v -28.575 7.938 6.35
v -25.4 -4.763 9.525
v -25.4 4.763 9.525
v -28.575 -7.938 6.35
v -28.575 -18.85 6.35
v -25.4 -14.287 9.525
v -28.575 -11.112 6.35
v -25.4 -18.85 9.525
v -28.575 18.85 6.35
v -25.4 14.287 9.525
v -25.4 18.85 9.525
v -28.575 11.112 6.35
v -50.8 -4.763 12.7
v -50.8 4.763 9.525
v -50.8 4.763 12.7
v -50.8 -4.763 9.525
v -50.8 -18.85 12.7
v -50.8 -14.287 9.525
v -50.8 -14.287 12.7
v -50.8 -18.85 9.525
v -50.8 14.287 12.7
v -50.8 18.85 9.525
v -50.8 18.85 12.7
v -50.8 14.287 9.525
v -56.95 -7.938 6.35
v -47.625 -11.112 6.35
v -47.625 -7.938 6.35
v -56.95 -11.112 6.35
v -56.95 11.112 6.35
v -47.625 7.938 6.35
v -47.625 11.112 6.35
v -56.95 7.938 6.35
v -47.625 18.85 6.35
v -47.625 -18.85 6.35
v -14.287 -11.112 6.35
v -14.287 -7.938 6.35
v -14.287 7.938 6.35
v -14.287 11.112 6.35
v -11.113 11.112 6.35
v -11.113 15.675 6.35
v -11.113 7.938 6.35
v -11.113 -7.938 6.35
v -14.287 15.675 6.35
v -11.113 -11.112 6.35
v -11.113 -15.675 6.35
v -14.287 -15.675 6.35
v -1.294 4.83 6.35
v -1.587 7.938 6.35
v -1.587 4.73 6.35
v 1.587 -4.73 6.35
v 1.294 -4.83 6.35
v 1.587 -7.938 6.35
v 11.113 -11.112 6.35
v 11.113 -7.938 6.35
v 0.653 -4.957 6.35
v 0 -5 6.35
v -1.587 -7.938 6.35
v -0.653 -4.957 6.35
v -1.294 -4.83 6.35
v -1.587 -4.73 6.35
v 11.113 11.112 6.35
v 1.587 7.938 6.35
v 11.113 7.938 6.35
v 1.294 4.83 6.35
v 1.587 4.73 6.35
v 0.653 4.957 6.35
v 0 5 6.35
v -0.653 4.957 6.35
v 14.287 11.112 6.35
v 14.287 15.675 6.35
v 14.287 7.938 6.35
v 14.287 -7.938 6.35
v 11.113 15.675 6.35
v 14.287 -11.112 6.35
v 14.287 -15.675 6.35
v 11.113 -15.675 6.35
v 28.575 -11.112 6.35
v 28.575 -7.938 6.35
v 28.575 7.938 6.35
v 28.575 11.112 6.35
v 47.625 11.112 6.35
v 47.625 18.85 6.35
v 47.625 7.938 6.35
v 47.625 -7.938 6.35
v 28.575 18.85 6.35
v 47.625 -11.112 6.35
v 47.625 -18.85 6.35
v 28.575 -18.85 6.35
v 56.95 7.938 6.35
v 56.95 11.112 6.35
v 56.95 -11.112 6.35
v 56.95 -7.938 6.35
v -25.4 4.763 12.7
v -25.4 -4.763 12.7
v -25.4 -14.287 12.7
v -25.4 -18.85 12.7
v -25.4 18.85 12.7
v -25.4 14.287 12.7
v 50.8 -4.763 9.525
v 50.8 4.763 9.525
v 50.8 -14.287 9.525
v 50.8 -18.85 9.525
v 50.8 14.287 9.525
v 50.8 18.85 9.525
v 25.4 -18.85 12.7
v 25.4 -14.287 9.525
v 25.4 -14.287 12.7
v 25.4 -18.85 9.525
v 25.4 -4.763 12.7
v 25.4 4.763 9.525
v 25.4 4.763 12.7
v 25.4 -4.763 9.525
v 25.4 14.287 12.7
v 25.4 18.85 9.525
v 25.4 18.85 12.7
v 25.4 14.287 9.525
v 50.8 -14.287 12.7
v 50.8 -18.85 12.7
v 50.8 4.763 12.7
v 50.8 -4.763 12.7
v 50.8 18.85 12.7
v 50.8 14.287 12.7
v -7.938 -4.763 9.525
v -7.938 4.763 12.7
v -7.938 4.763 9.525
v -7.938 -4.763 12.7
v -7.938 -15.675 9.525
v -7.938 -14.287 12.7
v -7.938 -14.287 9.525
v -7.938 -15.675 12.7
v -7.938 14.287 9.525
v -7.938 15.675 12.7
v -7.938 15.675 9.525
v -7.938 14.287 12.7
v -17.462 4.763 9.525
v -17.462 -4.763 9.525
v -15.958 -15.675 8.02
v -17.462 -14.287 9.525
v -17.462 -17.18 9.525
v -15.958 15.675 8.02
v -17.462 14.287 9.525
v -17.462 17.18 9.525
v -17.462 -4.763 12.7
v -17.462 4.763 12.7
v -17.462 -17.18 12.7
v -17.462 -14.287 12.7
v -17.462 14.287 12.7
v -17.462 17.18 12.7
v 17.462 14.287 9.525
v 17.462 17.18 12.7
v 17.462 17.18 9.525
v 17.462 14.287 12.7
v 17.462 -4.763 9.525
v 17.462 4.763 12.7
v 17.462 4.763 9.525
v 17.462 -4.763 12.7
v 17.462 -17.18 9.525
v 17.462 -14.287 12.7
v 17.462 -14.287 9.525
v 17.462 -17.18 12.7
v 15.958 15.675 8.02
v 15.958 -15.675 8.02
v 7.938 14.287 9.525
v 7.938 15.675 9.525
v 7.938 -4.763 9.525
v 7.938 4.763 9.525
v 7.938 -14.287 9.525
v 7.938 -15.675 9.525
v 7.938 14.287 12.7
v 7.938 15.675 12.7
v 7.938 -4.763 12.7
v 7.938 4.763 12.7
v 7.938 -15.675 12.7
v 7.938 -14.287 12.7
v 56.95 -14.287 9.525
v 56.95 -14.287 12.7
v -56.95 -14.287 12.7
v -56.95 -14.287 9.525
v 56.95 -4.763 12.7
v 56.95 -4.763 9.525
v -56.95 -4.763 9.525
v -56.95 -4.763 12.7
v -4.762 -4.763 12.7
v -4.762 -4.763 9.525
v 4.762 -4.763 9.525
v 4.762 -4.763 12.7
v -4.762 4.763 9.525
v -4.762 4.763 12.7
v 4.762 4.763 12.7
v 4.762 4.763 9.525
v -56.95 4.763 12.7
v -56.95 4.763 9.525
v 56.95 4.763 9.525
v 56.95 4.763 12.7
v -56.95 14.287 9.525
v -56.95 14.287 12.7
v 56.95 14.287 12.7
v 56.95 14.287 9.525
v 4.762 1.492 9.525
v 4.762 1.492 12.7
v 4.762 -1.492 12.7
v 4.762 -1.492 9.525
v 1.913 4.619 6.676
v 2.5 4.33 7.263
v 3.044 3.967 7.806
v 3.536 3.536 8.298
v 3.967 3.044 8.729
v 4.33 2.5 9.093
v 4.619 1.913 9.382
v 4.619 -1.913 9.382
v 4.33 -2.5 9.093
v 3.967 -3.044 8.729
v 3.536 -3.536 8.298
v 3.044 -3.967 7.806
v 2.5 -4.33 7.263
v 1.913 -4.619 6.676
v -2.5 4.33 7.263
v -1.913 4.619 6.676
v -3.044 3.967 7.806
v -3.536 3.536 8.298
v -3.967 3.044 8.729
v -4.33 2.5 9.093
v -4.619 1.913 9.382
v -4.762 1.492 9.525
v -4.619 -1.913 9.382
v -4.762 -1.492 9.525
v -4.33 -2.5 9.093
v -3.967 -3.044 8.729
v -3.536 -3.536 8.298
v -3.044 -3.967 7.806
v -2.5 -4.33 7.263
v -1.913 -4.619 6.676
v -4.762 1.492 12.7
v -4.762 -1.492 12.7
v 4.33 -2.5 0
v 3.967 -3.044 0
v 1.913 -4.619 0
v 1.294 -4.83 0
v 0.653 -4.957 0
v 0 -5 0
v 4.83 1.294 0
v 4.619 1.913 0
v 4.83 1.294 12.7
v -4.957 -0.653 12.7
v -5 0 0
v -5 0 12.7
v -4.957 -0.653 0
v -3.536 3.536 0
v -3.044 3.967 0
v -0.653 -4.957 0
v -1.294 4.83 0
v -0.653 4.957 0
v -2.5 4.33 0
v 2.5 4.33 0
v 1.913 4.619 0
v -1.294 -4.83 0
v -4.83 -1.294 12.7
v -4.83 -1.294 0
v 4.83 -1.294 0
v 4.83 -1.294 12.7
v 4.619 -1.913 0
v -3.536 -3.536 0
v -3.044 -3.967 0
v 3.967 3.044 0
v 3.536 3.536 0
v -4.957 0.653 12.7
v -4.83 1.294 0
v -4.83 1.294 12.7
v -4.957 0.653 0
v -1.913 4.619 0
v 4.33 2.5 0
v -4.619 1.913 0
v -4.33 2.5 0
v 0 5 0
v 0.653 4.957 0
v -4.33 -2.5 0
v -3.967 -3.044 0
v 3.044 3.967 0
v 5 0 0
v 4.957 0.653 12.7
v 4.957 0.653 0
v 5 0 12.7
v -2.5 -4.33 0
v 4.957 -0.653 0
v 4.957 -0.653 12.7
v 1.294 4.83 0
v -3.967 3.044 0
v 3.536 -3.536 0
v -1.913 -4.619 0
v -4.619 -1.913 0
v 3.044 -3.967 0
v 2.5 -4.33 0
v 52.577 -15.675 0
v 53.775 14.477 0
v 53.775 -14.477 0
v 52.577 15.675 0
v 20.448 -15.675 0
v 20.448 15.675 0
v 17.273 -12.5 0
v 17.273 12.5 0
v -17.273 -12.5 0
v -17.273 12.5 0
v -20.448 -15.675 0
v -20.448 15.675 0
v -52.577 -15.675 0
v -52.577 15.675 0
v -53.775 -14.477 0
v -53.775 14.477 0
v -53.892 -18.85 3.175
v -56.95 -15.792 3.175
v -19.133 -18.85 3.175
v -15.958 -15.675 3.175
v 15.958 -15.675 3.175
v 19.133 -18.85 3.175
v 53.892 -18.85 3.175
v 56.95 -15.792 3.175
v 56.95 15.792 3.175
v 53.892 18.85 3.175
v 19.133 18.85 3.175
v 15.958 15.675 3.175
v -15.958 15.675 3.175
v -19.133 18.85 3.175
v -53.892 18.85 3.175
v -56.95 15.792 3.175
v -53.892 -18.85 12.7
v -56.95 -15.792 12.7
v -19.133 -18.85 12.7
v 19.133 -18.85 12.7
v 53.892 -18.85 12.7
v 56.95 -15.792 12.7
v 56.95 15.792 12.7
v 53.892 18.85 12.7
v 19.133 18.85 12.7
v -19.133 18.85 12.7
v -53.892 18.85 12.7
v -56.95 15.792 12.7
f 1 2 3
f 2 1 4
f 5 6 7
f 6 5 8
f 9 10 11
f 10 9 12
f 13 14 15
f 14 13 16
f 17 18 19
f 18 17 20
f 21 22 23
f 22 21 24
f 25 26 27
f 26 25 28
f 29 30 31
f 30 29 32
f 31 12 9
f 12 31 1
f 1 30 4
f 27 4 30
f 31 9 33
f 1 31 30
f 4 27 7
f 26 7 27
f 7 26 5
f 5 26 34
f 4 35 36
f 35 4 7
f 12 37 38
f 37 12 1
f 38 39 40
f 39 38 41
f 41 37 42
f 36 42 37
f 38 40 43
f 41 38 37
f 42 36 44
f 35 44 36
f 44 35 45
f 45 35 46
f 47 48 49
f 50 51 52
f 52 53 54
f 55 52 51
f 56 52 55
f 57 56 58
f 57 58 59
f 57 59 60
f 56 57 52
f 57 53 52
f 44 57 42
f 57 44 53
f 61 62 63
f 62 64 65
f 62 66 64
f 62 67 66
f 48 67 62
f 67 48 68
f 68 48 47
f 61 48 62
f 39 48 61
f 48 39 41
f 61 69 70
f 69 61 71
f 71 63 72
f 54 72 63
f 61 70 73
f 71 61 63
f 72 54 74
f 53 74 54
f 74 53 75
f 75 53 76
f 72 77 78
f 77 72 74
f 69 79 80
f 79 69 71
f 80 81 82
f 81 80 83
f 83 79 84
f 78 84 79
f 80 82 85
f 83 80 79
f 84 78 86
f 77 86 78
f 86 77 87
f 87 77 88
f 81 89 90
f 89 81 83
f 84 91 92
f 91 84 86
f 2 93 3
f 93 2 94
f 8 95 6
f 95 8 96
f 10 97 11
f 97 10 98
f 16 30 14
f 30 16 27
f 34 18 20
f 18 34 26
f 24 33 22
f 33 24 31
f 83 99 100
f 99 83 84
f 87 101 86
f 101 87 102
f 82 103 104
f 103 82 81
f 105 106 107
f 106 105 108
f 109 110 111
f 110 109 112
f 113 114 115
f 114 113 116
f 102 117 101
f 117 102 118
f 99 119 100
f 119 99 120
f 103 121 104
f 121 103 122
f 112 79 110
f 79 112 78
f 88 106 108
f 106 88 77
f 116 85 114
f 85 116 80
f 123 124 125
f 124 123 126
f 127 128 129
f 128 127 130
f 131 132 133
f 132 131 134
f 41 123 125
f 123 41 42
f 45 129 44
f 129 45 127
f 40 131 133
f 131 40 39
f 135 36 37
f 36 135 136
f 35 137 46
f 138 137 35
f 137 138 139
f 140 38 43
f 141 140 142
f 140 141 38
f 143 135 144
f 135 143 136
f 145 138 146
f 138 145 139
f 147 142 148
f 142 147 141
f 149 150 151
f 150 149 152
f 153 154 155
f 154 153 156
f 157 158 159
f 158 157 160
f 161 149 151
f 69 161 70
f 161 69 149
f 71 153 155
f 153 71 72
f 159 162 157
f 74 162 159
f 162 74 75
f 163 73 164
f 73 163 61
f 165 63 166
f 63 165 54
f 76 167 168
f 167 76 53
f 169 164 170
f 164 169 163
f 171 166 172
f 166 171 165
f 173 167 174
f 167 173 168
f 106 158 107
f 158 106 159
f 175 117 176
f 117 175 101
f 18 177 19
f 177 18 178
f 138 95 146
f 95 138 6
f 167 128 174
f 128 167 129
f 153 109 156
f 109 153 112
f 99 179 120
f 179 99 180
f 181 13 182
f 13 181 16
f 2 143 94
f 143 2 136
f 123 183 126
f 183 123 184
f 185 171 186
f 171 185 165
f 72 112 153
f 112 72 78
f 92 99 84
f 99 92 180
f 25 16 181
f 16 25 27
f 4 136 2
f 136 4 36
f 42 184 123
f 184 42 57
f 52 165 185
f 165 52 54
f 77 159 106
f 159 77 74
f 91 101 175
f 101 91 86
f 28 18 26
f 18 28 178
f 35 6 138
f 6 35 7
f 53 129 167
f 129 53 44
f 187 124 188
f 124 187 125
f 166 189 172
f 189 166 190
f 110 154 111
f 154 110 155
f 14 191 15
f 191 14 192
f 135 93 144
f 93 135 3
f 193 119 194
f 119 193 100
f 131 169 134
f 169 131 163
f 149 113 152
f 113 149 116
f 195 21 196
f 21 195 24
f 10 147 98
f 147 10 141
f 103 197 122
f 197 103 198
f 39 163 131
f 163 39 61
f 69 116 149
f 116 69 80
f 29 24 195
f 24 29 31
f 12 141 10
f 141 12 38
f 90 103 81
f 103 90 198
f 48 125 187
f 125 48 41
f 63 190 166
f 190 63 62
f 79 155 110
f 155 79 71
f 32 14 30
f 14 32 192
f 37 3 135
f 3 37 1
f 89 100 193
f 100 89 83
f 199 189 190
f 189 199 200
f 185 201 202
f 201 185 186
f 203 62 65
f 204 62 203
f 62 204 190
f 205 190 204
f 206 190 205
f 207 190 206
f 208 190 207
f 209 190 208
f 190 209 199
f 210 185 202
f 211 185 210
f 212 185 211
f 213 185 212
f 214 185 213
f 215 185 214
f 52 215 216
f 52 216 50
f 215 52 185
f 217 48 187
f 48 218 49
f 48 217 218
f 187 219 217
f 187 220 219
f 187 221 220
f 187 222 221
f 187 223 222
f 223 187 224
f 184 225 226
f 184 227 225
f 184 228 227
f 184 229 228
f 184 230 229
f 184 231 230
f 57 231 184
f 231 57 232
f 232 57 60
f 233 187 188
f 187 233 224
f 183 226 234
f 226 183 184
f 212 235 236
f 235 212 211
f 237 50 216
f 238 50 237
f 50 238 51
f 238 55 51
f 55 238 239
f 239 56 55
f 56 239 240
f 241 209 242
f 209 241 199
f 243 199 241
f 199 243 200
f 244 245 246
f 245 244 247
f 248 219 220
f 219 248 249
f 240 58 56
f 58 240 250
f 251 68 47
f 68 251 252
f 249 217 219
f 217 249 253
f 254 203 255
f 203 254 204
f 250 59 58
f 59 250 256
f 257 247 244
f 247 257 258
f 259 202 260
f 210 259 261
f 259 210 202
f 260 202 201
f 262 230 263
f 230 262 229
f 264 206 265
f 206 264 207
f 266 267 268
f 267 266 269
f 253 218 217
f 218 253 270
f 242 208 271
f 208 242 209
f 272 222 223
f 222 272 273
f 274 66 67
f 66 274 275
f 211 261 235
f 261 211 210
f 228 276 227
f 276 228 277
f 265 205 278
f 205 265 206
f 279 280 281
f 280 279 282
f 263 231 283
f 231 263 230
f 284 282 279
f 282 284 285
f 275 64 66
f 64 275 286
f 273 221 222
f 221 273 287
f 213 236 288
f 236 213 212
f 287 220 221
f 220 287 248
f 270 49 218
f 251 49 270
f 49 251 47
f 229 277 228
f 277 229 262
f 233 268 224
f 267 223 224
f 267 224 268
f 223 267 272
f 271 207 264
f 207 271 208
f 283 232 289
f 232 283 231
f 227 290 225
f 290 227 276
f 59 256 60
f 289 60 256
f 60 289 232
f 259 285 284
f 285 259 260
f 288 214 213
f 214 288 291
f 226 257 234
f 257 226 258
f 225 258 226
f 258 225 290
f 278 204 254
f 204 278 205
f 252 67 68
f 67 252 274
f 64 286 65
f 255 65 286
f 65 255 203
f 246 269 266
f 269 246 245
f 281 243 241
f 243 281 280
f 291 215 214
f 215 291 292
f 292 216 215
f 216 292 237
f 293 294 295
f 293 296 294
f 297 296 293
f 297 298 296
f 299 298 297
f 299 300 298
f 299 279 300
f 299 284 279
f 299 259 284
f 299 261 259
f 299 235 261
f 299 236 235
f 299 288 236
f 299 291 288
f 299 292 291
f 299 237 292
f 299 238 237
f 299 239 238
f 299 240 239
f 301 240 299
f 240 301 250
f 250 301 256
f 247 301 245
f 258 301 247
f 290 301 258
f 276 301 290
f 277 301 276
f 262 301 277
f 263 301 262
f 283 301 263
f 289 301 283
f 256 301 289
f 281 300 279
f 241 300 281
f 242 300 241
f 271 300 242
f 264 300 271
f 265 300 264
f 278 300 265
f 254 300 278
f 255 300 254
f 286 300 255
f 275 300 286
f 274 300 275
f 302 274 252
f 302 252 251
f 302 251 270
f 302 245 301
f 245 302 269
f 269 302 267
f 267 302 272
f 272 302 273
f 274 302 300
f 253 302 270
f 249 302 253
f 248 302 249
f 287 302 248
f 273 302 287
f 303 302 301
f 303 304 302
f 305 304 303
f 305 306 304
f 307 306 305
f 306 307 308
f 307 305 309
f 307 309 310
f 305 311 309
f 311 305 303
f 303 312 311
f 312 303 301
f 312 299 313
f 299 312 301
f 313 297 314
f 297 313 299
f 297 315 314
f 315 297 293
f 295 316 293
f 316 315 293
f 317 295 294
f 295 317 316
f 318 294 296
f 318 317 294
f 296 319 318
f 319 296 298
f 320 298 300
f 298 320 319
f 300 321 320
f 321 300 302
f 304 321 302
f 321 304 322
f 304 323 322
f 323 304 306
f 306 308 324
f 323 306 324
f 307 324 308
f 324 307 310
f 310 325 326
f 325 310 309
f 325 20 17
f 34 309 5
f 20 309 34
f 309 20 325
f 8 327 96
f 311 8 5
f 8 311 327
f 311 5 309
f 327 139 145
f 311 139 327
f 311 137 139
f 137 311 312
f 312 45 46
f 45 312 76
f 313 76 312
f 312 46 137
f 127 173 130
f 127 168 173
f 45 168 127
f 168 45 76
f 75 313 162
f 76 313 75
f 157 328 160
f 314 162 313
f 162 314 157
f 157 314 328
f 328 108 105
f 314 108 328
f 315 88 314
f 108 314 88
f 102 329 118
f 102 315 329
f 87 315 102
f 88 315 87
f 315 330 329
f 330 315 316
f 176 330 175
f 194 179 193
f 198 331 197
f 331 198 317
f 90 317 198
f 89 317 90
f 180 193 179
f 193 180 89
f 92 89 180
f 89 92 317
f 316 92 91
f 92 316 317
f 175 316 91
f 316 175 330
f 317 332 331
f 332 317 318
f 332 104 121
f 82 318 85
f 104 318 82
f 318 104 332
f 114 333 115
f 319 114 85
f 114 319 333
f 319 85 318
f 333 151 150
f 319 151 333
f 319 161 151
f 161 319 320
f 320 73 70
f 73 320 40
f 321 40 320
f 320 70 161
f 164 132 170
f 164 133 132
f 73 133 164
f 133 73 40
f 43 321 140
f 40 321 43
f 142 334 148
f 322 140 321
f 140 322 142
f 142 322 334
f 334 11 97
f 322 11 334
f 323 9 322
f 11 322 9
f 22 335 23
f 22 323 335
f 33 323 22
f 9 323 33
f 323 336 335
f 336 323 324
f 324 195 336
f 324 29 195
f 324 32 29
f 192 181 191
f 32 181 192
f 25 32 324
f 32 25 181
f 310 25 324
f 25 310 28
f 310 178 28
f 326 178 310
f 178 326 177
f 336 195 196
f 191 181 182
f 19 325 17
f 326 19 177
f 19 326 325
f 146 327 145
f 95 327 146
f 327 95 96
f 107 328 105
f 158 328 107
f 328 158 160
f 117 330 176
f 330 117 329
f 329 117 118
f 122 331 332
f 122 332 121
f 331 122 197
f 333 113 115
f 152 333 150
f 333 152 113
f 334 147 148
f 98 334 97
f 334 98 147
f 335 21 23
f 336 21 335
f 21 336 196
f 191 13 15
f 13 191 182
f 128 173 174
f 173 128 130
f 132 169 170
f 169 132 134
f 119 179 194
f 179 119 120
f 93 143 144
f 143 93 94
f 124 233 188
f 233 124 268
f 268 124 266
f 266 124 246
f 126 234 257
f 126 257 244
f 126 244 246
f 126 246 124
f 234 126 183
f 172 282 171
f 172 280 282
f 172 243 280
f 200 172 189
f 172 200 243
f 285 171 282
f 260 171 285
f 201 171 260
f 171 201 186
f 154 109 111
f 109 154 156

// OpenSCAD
// file: ../lib/TOGArrayLib1.scad
// TOGArrayLib1.4
// 
// Functions for working with arrays.
// 
// v1.1:
// - tal1_reduce assert(is_list(items)) to prevent infinite recursion
//   when given undefined or other non-list values
// v1.1.1:
// - Fix tal1_uniq_remap_v2 to return "list-remap-result" as the
//   first element of the returned list
// v1.2:
// - Add tal1_replace_at function
// v1.3:
// - tal1_is_vec_of, tal1_is_vec_of_num
// v1.4:
// - tal1_assert_for_each, for when you want to assert something
//   about each of a list of items and get nice failure messages

/**
 * Make a list with the contents of list `a`,
 * but starting at offset `off`, replaced by the contents of list `b`.
 * len(result) = max(len(a), off+len(b))
 */
function tal1_replace_at(a, off, b, default_value=undef, default_value_function=undef) =
	assert(is_list(a))
	assert(is_list(b))
	let( _dvf = !is_undef(default_value_function) ? default_value_function : function(i) default_value )
[
	for( i=[0:1:min(off,len(a))-1] ) a[i],
	for( i=[len(a):1:off-1] ) _dvf(i),
	for( i=[off:1:off+len(b)-1] ) b[i-off],
	for( i=[off+len(b):1:len(a)-1] ) a[i],
];

// Simplest case
assert([] == tal1_replace_at([], 0, []));
// Second simplest cases
assert(["foo"] == tal1_replace_at(["foo"], 0, []));
assert(["foo"] == tal1_replace_at([], 0, ["foo"]));
// Replace one item
assert(["foo","quux","baz"] == tal1_replace_at(["foo","bar","baz"], 1, ["quux"]));
// Replace and extend
assert(["foo","quux","tuna","tina"] == tal1_replace_at(["foo","bar","baz"], 1, ["quux", "tuna", "tina"]));
// Add beyond end of `a`
assert(["foo","zzz","quux"] == tal1_replace_at(["foo"], 2, ["quux"], default_value="zzz"));
// Adding 'nothing' should still fill to that point with defaults
assert(["foo","zzz","zzz"] == tal1_replace_at(["foo"], 3, [], default_value="zzz"));


function tal1_reduce(start, items, func, offset=0) =
	assert(is_list(items))
	len(items) == offset ? start :
	tal1_reduce(func(start, items[offset]), items, func, offset+1);

function tal1_consecutive_duplicate_count(items) = tal1_reduce(
	[0, undef],
	items,
	function(z,item) [z[0] + (item == z[1] ? 1 : 0), item]
)[0];

assert(0 == tal1_consecutive_duplicate_count([]));
assert(0 == tal1_consecutive_duplicate_count([50]));
assert(1 == tal1_consecutive_duplicate_count([50,50]));
assert(0 == tal1_consecutive_duplicate_count([50,51,52,53]));
assert(1 == tal1_consecutive_duplicate_count([50,51,52,52]));
assert(3 == tal1_consecutive_duplicate_count([50,50,50,50]));

// Set test_size to arbirarily large values
// to ensure that OpenSCAD can handle heavy recursion
let(test_size=1000) assert(test_size/2 == tal1_consecutive_duplicate_count([for(i=[0:1:test_size-1]) floor(i/2)]));



function tal1_uniq_(items, off0, off1) =
	let(chunklen = off1-off0)
	chunklen == 0 ? [] :
	chunklen == 1 ? [items[off0]] :
	let(half=floor(chunklen/2))
	let(left  = tal1_uniq_(items, off0     , off0+half))
	let(right = tal1_uniq_(items, off0+half, off1     ))
	assert(len(left) > 0)
	assert(len(right) > 0)
	left[len(left)-1] == right[0] ? [each left, for(i=[1:1:len(right)-1]) right[i]] :
	[each left, each right];

/** Given a list of items, returns a new list with identical consecutive items merged */
function tal1_uniq(items) = tal1_uniq_(items, 0, len(items));

assert([] == tal1_uniq([]));
assert([123] == tal1_uniq([123]));
assert([55,0,1,2,3] == tal1_uniq([55,0,1,2,3]));
assert([55,0,1,2] == tal1_uniq([55,0,1,1,2]));
assert([55,0,1] == tal1_uniq([55,55,0,0,0,0,0,0,1,1,1,1]));
assert([55,0] == tal1_uniq([55,0,0,0,0,0,0,0]));



/**
 * Returns [new items, old index -> new index mapping].
 * No-op version.
 */
function tal1_uniq_remap_v1(items) =
	["list-remap-result", items, [for (vi=[0:1:len(items)-1]) vi]];

// [a, a, b, b, c, c]
//
// [a,    ...], []  -> [a],[0]
// [a, a, ...], [0] -> [a],[0,0]

assert([1,2,3] == [1,2,3]);

/**
 * Recursive version that will combine adjacent identical vertexes,
 * but will use the original items.
 */
function tal1_uniq_remap_v2(items, map=[]) =
	let(index = len(map))
	len(items) == index ? ["list-remap-result", items, map] :
	index == 0 ? tal1_uniq_remap_v2(items, [0]) :
	items[index] == items[map[index-1]] ? tal1_uniq_remap_v2(items, [for(vi=map) vi, map[index-1]]) :
	tal1_uniq_remap_v2(items, [for(vi=map) vi, index]);

assert(tal1_uniq_remap_v2([1,1,2,2,3,4]) == ["list-remap-result", [1,1,2,2,3,4], [0,0,2,2,4,5]]);


/**
 * Returns true if `vec` is a list of at least min_len items
 * and component_check(each item, even those beyond min_len) is true.
 */
function tal1_is_vec_of(vec, min_len=0, component_check=function(x) true) =
	assert(is_num(min_len) && min_len >= 0)
	assert(is_function(component_check))
	is_list(vec) && len(vec) >= min_len &&
	tal1_reduce(true, vec, function(prev,item) prev && component_check(item));

function tal1_is_vec_of_num(vec, min_len=0) = tal1_is_vec_of(vec, min_len, function(i) is_num(i));

assert( true == tal1_is_vec_of_num([1,2,3]));
assert( true == tal1_is_vec_of_num([]));
assert( true == tal1_is_vec_of_num([1,2,3], 3));
assert(false == tal1_is_vec_of_num([1,2], 3));
assert(false == tal1_is_vec_of_num([1,2,"spoon"], 3));
// Requirements are ambiguous when
// first min_len items are numbers, but there are non-numeric items afterwards,
// so let's error on the side of saying 'no, it's not a list of numbers';
// i.e. the item check and the min_len are independent.
assert(false == tal1_is_vec_of_num([1,2,3,"artichoke"], 3));


/**
 * Asserts that item_checker(each item in list, index of item)[0] is true.
 * Second element of item_checker return value is assertion message.
 * Returns the original list, in case that's useful to you.
 */
function tal1_assert_for_each(list, item_checker) =
	let( _ignored = [ for(i=[0:1:len(list)-1])
		let(q=item_checker(list[i],i))
		let(passed=is_bool(q) ? q : is_list(q) ? q[0] : assert(false, str(
			"tal1_assert_for_each: item_checker should return Bool|[Bool,String], but returned ",
			q, " for item at index ", i)))
		let(message=is_list(q) ? q[1] : undef)
		assert(passed, message)
		q
	])
	list;

// Callback can return a boolean...
assert([1,2,3] == tal1_assert_for_each([1,2,3], function(v,i) is_num(v)));
// ...or a [boolean, string]
assert([1,2,3] == tal1_assert_for_each([1,2,3], function(v,i) [is_num(v), "element be a num"]));
// file: ../lib/TOGPolyhedronLib1.scad
// TOGPolyhedronLib1.4
// 
// v1.1:
// - tphl1_make_polyhedron_from_layer_function can take a list of inputs ('layer keys')
//   to the layer function as first argument as alternative to 'layer_count'
// v1.1.1:
// - Some assertions
// v1.1.2:
// - tphl1_make_polyhedron_from_layers: assert that all layers are the same length
// v1.2:
// - tphl1_make_rounded_cuboid, which can also make spheres
// v1.2.1:
// - Refactor some assertions to use tal1_assert_for_each
// v1.3:
// - tphl1_make_rounded_cuboid: Special case to avoid extra triangles
//   when radii[2] == 0 (i.e. top and bottom are flat)
// v1.4:
// - Document correct winding order
// - Fix tphl1_make_rounded_cuboid to use correct winding order

// Winding order:
// 
// tphl1_make_polyhedron_from_layers expects layers to be specified
// bottom-to-top, with points for each counter-clockwise when viewed
// from the top.  i.e. the first layer appears clockwise from outside,
// and the last layer counter-clockwise from outside.
// 
// OpenSCAD wants polyhedron faces to be defined in clockwise-when-seen-from-outside order,
// which is opposite the order that STL files expect.
// 
// If you make your faces counter-clockwise, your shape might
// be invisible in preview and need to be rendered to become visible.
// Use View > Thrown Together to show wrongly-oriented faces as purple.

function tphl1_cap_faces( layers, layerspan, li, reverse=false ) = [
	[for( vi=reverse ? [0 : 1 : layerspan-1] : [layerspan-1 : -1 : 0] ) (vi%layerspan)+layerspan*li]
];

function tphl1_layer_faces( layers, layerspan, i ) =
assert(is_list(layers))
assert(is_num(layerspan))
assert(is_num(i))
let( l0 = i*layerspan )
let( l1 = (i+1)*layerspan )
[
	for( vi=[0 : 1 : len(layers[i])-1] ) each [
		// By making triangles instead of quads,
		// we can avoid some avoidable 'non-planar face' warnings.
		[
			l0 + vi,
			l1 + (vi+1)%layerspan,
			l0 + (vi+1) % layerspan,
		],
		[
			l0 + vi,
			l1 + vi,
			l1 + (vi+1)%layerspan,
		],
	]
];

function tphl1_faces( layers, layerspan, cap_bottom=true, cap_top=true ) = [
	each tphl1_cap_faces( layers, layerspan, 0, reverse=true ),
	// For now, assume convex end caps
	for( li=[0 : 1 : len(layers)-2] ) each tphl1_layer_faces(layers, layerspan, li),
	each tphl1_cap_faces( layers, layerspan, len(layers)-1, reverse=false )
];

function tphl1_points(layers, layerspan) = [
	for( layer=layers ) for( point=layer ) point
];

function tphl1__remap_face_vertexes(faces, index_map) =
	assert(is_list(faces))
	assert(is_list(index_map))
[
	for( face=faces )
		let(face1=[
			// Remap
			for(vi=face)
			assert(is_num(vi))
			assert(vi < len(index_map))
			assert(is_num(index_map[vi]))
			index_map[vi]
		])
		let(face2=tal1_uniq(face1))
		each len(face2) >= 3 ? [face2] : []
];

use <./TOGArrayLib1.scad>

function tphl1_make_polyhedron_from_layers(layers, cap_bottom=true, cap_top=true) =
	assert(is_list(layers))
	assert(len(layers) >= 2)
	assert(is_list(layers[0]))
	let(minmax_layer_count = tal1_reduce([-9999999,9999999], layers, function(prev,layer) [max(prev[0],len(layer)), min(prev[1],len(layer))]))
	assert(minmax_layer_count[0] == minmax_layer_count[1],
		str("Layers differ in point count, from ", minmax_layer_count[0], " to ", minmax_layer_count[1]))
	let(points1 = tphl1_points(layers, len(layers[0])))
	let(faces1  = tphl1_faces(layers, len(layers[0]), cap_bottom=cap_bottom, cap_top=cap_top))
	let(vertex_remap_result = tal1_uniq_remap_v2(points1))
	let(points2 = vertex_remap_result[1])
	let(faces2 = tphl1__remap_face_vertexes(faces1, vertex_remap_result[2]))
	["polyhedron-vf", points2, faces2];

function tphl1_make_polyhedron_from_layer_function(layer_keys, layer_points_function, cap_bottom=true, cap_top=true) =
	let(indexes = is_num(layer_keys) ? [0:1:layer_keys-1] : is_list(layer_keys) ? layer_keys : assert(false, "Layer list must be number or list"))
	let(layers = [for(li=indexes) layer_points_function(li)])
	tphl1_make_polyhedron_from_layers(layers, cap_bottom=cap_bottom, cap_top=cap_top);

use <./TOGMod1Constructors.scad>

function tphl1_make_rounded_cuboid(size, r) =
	assert(tal1_is_vec_of_num(size, 3), "tphl1_make_rounded_cuboid: size should be a Vec3<Num>")
	let(radii = tal1_assert_for_each(
		is_list(r) ? r : is_num(r) ? [r, r, r] : assert(false, "r(adius) should be list<num> or num"),
		function(r,i) [
			is_num(r) && size[i] >= r*2,
			str("size[",i,"] must be >= 2*r[",i,"]; size[0] = ",size[i],", 2*r[",i,"] = ", 2*r)
		]
	))
	// Need to be consistent when asking for rounded rect points,
	// lest rounding errors give different results for different layers
	let(is_semicircle_x = size[0] == radii[0]*2)
	let(is_semicircle_y = size[1] == radii[1]*2)
	let(quarterfn = max(ceil($fn/4), 1))
	tphl1_make_polyhedron_from_layer_function(
		radii[2] == 0 ? [
			[-size[2]/2, 90],
			[ size[2]/2, 90],
		] : [
			for( zai=[0 : 1 : quarterfn] ) let(ang= 0 + zai*90/quarterfn) [-size[2]/2 + radii[2] - radii[2] * cos(ang), ang],
			for( zai=[0 : 1 : quarterfn] ) let(ang=90 + zai*90/quarterfn) [ size[2]/2 - radii[2] - radii[2] * cos(ang), ang]
		],
		function( z_za )
			let( z=z_za[0] )
			let( zang=z_za[1] )
			let( sinzang=sin(zang) )
			let( lrx=radii[0]*sinzang )
			let( lry=radii[1]*sinzang )
			togmod1_rounded_rect_points([
				// max() to avoid failure due to rounding error
				is_semicircle_x ? 2*lrx : size[0]+radii[0]*2*(sinzang-1),
				is_semicircle_y ? 2*lry : size[1]+radii[1]*2*(sinzang-1),
			], r=[
				lrx,
				lry,
			], pos=[0,0,z_za[0]])
	);
// file: ../lib/TOGMod1Constructors.scad
// TOGMod1Constructors-v1.4
// 
// Functions to construct objects understood by TOGMod1
// 
// v1.1:
// - Add togmod1_make_rounded_rect
// v1.2:
// - togmod1_make_rounded_rect can make ovals
// v1.3:
// - togmod1_circle_points, to just get the points of a circle
// - if pos parameter to circle function has a third element,
//   returned vertexes will include it as the z component;
// v1.3.1
// - Some assertions
// v1.4:
// - Refactor togmod1_rounded_rect_points and togmod1_circle_points
//   to use togmod1__make_nd_vector_adder for adapting to whatever
//   `pos` parameter is.

use <./TOGArrayLib1.scad>

function togmod1__make_nd_vector_adder(origin=[0,0]) =
	let(origin_is_zero = tal1_reduce(true, origin, function(prev,item) prev && item == 0))
	origin_is_zero ? (function(vec) len(vec) >= len(origin) ? vec : tal1_replace_at(origin, 0, vec)) :
	function(vec) [
		for(i=[0:1:max(len(origin),len(vec))-1]) (len(vec) > i ? vec[i] : 0) + (len(origin) > i ? origin[i] : 0),
	];

assert([1,2,3] == togmod1__make_nd_vector_adder()([1,2,3]));
echo(togmod1__make_nd_vector_adder([0,0,3])([1,2]));
assert([1,2,3] == togmod1__make_nd_vector_adder([0,0,3])([1,2]));


function togmod1_make_cuboid(size) =
	assert(is_list(size))
	assert(len(size) >= 3)
	assert(is_num(size[0]))
	assert(is_num(size[1]))
	assert(is_num(size[2]))
	["polyhedron-vf", [
		[-size[0]/2, -size[1]/2, -size[2]/2],
		[+size[0]/2, -size[1]/2, -size[2]/2],
		[-size[0]/2, +size[1]/2, -size[2]/2],
		[+size[0]/2, +size[1]/2, -size[2]/2],
		[-size[0]/2, -size[1]/2, +size[2]/2],
		[+size[0]/2, -size[1]/2, +size[2]/2],
		[-size[0]/2, +size[1]/2, +size[2]/2],
		[+size[0]/2, +size[1]/2, +size[2]/2]
	], [
		[0,1,3,2],[0,4,5,1],[4,6,7,5],[3,7,6,2],[1,5,7,3],[6,4,0,2]
	]];

function togmod1_make_polygon(verts) =
	["polygon-vp", verts, [[for( i=[0:1:len(verts)-1] ) i%len(verts)]]];

function togmod1_rounded_rect_points(size, r, pos=[0,0]) =
	assert(is_list(size))
	assert(len(size) >= 2)
	let(radii = is_list(r) ? r : is_num(r) ? [r,r] : assert(false, "rounded_rect r(adius) should be list<num> or num"))
	let(rx = radii[0])
	let(ry = radii[1])
	assert(is_num(rx))
	assert(is_num(ry))
	assert(size[0] >= 2*rx, str("size[0] must be >= 2*r[0]; size[0] = ",size[0],", 2*r[0] = ",2*rx))
	assert(size[1] >= 2*ry, str("size[1] must be >= 2*r[1]; size[1] = ",size[1],", 2*r[1] = ",2*ry))
	let(quarterfn=max($fn/4, 1))
	let(qfnx = size[0] == 2*rx ? quarterfn-1 : quarterfn)
	let(qfny = size[1] == 2*ry ? quarterfn-1 : quarterfn)
	let(finalizepos = togmod1__make_nd_vector_adder(pos))
[
	for(a=[0 : 1 : qfnx]) let(ang=      a*90/quarterfn) finalizepos([ size[0]/2-rx + rx*cos(ang),  size[1]/2-ry + ry*sin(ang)]),
	for(a=[0 : 1 : qfny]) let(ang= 90 + a*90/quarterfn) finalizepos([-size[0]/2+rx + rx*cos(ang),  size[1]/2-ry + ry*sin(ang)]),
	for(a=[0 : 1 : qfnx]) let(ang=180 + a*90/quarterfn) finalizepos([-size[0]/2+rx + rx*cos(ang), -size[1]/2+ry + ry*sin(ang)]),
	for(a=[0 : 1 : qfny]) let(ang=270 + a*90/quarterfn) finalizepos([ size[0]/2-rx + rx*cos(ang), -size[1]/2+ry + ry*sin(ang)]),
];

function togmod1_make_rounded_rect(size, r) =
	togmod1_make_polygon(togmod1_rounded_rect_points(size,r));

function togmod1_circle_points(r, pos=[0,0], d=undef) =
	assert( !is_undef(r) || !is_undef(d) )
	assert(!is_undef(pos[0]))
	assert(!is_undef(pos[1]))
	let(finalizepos = togmod1__make_nd_vector_adder(pos))
	let(r_ = !is_undef(r) ? r : d/2)
	let(fn = max($fn, 6))
	[for(i=[0 : 1 : fn-1]) finalizepos([r_*cos(i*360/fn), r_*sin(i*360/fn)])];

function togmod1_make_circle(r, pos=[0,0], d=undef) =
	togmod1_make_polygon(togmod1_circle_points(r=r, pos=pos, d=d));

function togmod1_make_cylinder(d, zrange=[0,1], r=undef, pos=[0,0]) =
	assert( !is_undef(r) || !is_undef(d) )
	let( r_ = !is_undef(r) ? r : d/2 )
	// TODO: Make polyhedron directly
	["linear-extrude-zs", zrange, togmod1_make_circle(r=r_, pos=pos)];

function togmod1__is_range1d(range) = is_list(range) && len(range) == 2 && is_num(range[0]) && is_num(range[1]);

function togmod1_linear_extrude_z(range, shape) =
	assert(togmod1__is_range1d(range))
	["linear-extrude-zs", range, shape];
function togmod1_linear_extrude_x(range, shape) =
	assert(togmod1__is_range1d(range))
	["rotate", [90, 0, 90], togmod1_linear_extrude_z(range, shape)];
function togmod1_linear_extrude_y(range, shape) =
	assert(togmod1__is_range1d(range))
	["rotate", [90, 0, 180], togmod1_linear_extrude_z(range, shape)];
// file: ../lib/TOGMod1.scad
// TOGMod1
// OpenSCAD library for representing shapes
// 
// See also: Functional OpenSCAD (https://github.com/thehans/FunctionalOpenSCAD)

module togmod1_domodule(mod) {
	assert(is_list(mod));
	assert(len(mod) > 0);
	if( mod[0] == "polygon-vp" ) {
		// ["polygon-vp", vertexes, paths]
		polygon(points=mod[1], paths=mod[2]);
	} else if( mod[0] == "polyhedron-vf" ) {
		polyhedron(mod[1], faces=mod[2]);
	} else if( mod[0] == "scale" ) {
		assert(len(mod) == 3);
		scale(mod[1]) togmod1_domodule(mod[2]);
	} else if( mod[0] == "translate" ) {
		assert(len(mod) == 3);
		assert(is_list(mod[1]));
		for(c=mod[1]) assert(is_num(c), "translate component should be numeric");
		translate(mod[1]) togmod1_domodule(mod[2]);
	} else if( mod[0] == "rotate" ) {
		assert(len(mod) == 3);
		rotate(mod[1]) togmod1_domodule(mod[2]);
	} else if( mod[0] == "intersection" ) {
		intersection_for( i=[1:1:len(mod)-1] ) togmod1_domodule(mod[i]);
	} else if( mod[0] == "difference" ) {
		difference() {
			togmod1_domodule(mod[1]);
			for( i=[2:1:len(mod)-1] ) togmod1_domodule(mod[i]);
		}
	} else if( mod[0] == "union" ) {
		for( i=[1:1:len(mod)-1] ) togmod1_domodule(mod[i]);
	} else if( mod[0] == "hull" ) {
		hull() for( i=[1:1:len(mod)-1] ) togmod1_domodule(mod[i]);
	} else if( mod[0] == "linear-extrude-zs" ) {
		// ["linear-extrude-zs", [z0,z1], 2d_shape] // centered
		// ["linear-extrude-zs", height, 2d_shape]
		let( zrange = is_list(mod[1]) ? mod[1] : [-mod[1]/2, mod[1]/2] ) {
			translate([0,0,zrange[0]]) linear_extrude(zrange[1]-zrange[0]) togmod1_domodule(mod[2]);
		}
	} else if( mod[0] == "render" ) {
		render() togmod1_domodule(mod[1]);
	} else if( mod[0] == "x-debug" ) {
		# togmod1_domodule(mod[1]);
	} else {
		assert(false, str("Unrecognized shape: ", mod[0]));
	}
}
// main file
// JoistCableClip-v1.1
// 
// "w" to be bolted or clamped under a joist, parallel to the joist,
// to hold cables perpendicular to the joist.
//
// v1.1:
// - Reduce X, Y size slightly, by 'xy_margin'
// - Make it skinny in the middle and beveled on all bottom corners

xy_margin = 0.2;

use <../lib/TOGMod1.scad>
use <../lib/TOGMod1Constructors.scad>
use <../lib/TOGPolyhedronLib1.scad>

module __joisecableclip_end_params() { }

inch = 25.4;
chunk_pitch = 1.5*inch;
bevel_size = 1/8*inch;
block_size = [3*chunk_pitch, 1*chunk_pitch, 1/2*inch];
size = [block_size[0] - xy_margin*2, block_size[1] - xy_margin*2, block_size[2]];

$fn = $preview ? 12 : 48;



// Copied (and simplified--no special 0 case) from togmod1__make_nd_vector_adder;
// maybe this should become a TOGArrayLib function
function joisetcableclip__make_nd_vector_adder(origin=[0,0]) =
	function(vec) [
		for(i=[0:1:max(len(origin),len(vec))-1]) (len(vec) > i ? vec[i] : 0) + (len(origin) > i ? origin[i] : 0),
	];

function joisetcableclip__map(list, fun) = [ for(a=list) fun(a) ];



function scale_vec(v, s) =
	assert(is_list(v))
	is_num(s) ? v * s :
	is_list(s) ? [ for( i=[0 : 1 : min(len(v),len(s))-1] ) v[i]*s[i] ] :
	assert(false, str("Don't know how to scale_vec(", v, ", ", s, ")"));

function _sum(a, init=0, off=0) =
	len(a) == off ? init :
	_sum(a, a[off] + init, off+1);

function sum(a) =
	assert(is_list(a))
	assert(len(a) > 0)
	_sum(a, init=a[0], off=1);

function multiply_point_data(point_data, mults) = [
	for( d=point_data ) sum([for( i=[0 : 1 : min(len(mults), len(d))-1] ) scale_vec(d[i], mults[i])])
];

z41 = sqrt(2)-1; // Approximately 0.414

xy_shape_point_data = [
	// Assumes multipliers: block size, chunk size, center inset size, offset
	[[-0.5, -0.5], [   0, 0], [ 0, 1], [-1  , -z41]],
	[[-0.5, -0.5], [   0, 0], [ 1, 0], [-z41, -1  ]],
	
	[[ 0  , -0.5], [-0.5, 0], [ 0, 0], [ z41, -1  ]],
	[[ 0  , -0.5], [-0.5, 0], [ 1, 1], [ z41, -1  ]],
	[[ 0  , -0.5], [ 0.5, 0], [-1, 1], [-z41, -1  ]],
	[[ 0  , -0.5], [ 0.5, 0], [ 0, 0], [-z41, -1  ]],
	
	[[ 0.5, -0.5], [ 0  , 0], [-1, 0], [ z41, -1  ]],
	[[ 0.5, -0.5], [ 0  , 0], [ 0, 1], [ 1  , -z41]],
	
	[[ 0.5,  0.5], [ 0  , 0], [ 0,-1], [ 1  ,  z41]],
	[[ 0.5,  0.5], [ 0  , 0], [-1, 0], [ z41,  1  ]],
	
	[[ 0  ,  0.5], [ 0.5, 0], [ 0, 0], [-z41,  1  ]],
	[[ 0  ,  0.5], [ 0.5, 0], [-1,-1], [-z41,  1  ]],
	[[ 0  ,  0.5], [-0.5, 0], [ 1,-1], [ z41,  1  ]],
	[[ 0  ,  0.5], [-0.5, 0], [ 0, 0], [ z41,  1  ]],
	
	[[-0.5,  0.5], [ 0  , 0], [ 1, 0], [-z41,  1  ]],
	[[-0.5,  0.5], [ 0  , 0], [ 0,-1], [-1  ,  z41]],
];

// It hink that with a liiitle bit more work, since we already know the insets,
// we could automatically round all the corners!

function fluboid_points(size, b=3.175) =
	[
		[-size[0]/2 + b, -size[1]/2    ],
		[ size[0]/2 - b, -size[1]/2    ],
		[ size[0]/2    , -size[1]/2 + b],
		[ size[0]/2    ,  size[1]/2    ],
		[-size[0]/2    ,  size[1]/2    ],
		[-size[0]/2    , -size[1]/2 + b],
	];

function fluboid_x(size, b=3.175) = // togmod1_make_cuboid(size);
	togmod1_linear_extrude_x([-size[0]/2, size[0]/2], togmod1_make_polygon(fluboid_points([size[1], size[2]], b)));

function fluboid_y(size, b=3.175) = // togmod1_make_cuboid(size);
	togmod1_linear_extrude_y([-size[1]/2, size[1]/2], togmod1_make_polygon(fluboid_points([size[0], size[2]], b)));

function get_shape_points(inset, z) =
	assert(is_num(inset))
	assert(is_num(z))
	joisetcableclip__map(
		multiply_point_data(
			xy_shape_point_data,
			[block_size, chunk_pitch, bevel_size, -xy_margin - inset]
		),
		joisetcableclip__make_nd_vector_adder([0,0,z])
	);

togmod1_domodule(["difference",
	["intersection",
		// Alternatively, or in addition: intersect with a TOGridPile foot!
	 	tphl1_make_polyhedron_from_layers([
			get_shape_points(bevel_size, 0),
			get_shape_points(         0, bevel_size),
			get_shape_points(         0, block_size[2]),
		]),
	],
	
	for( x=[-1.5*inch, 1.5*inch] ) ["translate", [x, 0, size[2]], fluboid_y([1*inch, size[1]*2, 1/2*inch])],
	for( x=[-4/8*inch, 4/8*inch] ) ["translate", [x, 0, size[2]], fluboid_y([3/8*inch, size[1]*2, 1/2*inch])],
	for( y=[-3/8*inch, 3/8*inch] ) ["translate", [0, y, size[2]], fluboid_x([5*inch, 3/8*inch, 1/2*inch])],
	["translate", [0, 0, size[2]], fluboid_y([3/8*inch, 3/4*inch, 1/2*inch])],
	
	togmod1_make_cylinder(d=10, zrange=[-1, size[2]+1])
]);
